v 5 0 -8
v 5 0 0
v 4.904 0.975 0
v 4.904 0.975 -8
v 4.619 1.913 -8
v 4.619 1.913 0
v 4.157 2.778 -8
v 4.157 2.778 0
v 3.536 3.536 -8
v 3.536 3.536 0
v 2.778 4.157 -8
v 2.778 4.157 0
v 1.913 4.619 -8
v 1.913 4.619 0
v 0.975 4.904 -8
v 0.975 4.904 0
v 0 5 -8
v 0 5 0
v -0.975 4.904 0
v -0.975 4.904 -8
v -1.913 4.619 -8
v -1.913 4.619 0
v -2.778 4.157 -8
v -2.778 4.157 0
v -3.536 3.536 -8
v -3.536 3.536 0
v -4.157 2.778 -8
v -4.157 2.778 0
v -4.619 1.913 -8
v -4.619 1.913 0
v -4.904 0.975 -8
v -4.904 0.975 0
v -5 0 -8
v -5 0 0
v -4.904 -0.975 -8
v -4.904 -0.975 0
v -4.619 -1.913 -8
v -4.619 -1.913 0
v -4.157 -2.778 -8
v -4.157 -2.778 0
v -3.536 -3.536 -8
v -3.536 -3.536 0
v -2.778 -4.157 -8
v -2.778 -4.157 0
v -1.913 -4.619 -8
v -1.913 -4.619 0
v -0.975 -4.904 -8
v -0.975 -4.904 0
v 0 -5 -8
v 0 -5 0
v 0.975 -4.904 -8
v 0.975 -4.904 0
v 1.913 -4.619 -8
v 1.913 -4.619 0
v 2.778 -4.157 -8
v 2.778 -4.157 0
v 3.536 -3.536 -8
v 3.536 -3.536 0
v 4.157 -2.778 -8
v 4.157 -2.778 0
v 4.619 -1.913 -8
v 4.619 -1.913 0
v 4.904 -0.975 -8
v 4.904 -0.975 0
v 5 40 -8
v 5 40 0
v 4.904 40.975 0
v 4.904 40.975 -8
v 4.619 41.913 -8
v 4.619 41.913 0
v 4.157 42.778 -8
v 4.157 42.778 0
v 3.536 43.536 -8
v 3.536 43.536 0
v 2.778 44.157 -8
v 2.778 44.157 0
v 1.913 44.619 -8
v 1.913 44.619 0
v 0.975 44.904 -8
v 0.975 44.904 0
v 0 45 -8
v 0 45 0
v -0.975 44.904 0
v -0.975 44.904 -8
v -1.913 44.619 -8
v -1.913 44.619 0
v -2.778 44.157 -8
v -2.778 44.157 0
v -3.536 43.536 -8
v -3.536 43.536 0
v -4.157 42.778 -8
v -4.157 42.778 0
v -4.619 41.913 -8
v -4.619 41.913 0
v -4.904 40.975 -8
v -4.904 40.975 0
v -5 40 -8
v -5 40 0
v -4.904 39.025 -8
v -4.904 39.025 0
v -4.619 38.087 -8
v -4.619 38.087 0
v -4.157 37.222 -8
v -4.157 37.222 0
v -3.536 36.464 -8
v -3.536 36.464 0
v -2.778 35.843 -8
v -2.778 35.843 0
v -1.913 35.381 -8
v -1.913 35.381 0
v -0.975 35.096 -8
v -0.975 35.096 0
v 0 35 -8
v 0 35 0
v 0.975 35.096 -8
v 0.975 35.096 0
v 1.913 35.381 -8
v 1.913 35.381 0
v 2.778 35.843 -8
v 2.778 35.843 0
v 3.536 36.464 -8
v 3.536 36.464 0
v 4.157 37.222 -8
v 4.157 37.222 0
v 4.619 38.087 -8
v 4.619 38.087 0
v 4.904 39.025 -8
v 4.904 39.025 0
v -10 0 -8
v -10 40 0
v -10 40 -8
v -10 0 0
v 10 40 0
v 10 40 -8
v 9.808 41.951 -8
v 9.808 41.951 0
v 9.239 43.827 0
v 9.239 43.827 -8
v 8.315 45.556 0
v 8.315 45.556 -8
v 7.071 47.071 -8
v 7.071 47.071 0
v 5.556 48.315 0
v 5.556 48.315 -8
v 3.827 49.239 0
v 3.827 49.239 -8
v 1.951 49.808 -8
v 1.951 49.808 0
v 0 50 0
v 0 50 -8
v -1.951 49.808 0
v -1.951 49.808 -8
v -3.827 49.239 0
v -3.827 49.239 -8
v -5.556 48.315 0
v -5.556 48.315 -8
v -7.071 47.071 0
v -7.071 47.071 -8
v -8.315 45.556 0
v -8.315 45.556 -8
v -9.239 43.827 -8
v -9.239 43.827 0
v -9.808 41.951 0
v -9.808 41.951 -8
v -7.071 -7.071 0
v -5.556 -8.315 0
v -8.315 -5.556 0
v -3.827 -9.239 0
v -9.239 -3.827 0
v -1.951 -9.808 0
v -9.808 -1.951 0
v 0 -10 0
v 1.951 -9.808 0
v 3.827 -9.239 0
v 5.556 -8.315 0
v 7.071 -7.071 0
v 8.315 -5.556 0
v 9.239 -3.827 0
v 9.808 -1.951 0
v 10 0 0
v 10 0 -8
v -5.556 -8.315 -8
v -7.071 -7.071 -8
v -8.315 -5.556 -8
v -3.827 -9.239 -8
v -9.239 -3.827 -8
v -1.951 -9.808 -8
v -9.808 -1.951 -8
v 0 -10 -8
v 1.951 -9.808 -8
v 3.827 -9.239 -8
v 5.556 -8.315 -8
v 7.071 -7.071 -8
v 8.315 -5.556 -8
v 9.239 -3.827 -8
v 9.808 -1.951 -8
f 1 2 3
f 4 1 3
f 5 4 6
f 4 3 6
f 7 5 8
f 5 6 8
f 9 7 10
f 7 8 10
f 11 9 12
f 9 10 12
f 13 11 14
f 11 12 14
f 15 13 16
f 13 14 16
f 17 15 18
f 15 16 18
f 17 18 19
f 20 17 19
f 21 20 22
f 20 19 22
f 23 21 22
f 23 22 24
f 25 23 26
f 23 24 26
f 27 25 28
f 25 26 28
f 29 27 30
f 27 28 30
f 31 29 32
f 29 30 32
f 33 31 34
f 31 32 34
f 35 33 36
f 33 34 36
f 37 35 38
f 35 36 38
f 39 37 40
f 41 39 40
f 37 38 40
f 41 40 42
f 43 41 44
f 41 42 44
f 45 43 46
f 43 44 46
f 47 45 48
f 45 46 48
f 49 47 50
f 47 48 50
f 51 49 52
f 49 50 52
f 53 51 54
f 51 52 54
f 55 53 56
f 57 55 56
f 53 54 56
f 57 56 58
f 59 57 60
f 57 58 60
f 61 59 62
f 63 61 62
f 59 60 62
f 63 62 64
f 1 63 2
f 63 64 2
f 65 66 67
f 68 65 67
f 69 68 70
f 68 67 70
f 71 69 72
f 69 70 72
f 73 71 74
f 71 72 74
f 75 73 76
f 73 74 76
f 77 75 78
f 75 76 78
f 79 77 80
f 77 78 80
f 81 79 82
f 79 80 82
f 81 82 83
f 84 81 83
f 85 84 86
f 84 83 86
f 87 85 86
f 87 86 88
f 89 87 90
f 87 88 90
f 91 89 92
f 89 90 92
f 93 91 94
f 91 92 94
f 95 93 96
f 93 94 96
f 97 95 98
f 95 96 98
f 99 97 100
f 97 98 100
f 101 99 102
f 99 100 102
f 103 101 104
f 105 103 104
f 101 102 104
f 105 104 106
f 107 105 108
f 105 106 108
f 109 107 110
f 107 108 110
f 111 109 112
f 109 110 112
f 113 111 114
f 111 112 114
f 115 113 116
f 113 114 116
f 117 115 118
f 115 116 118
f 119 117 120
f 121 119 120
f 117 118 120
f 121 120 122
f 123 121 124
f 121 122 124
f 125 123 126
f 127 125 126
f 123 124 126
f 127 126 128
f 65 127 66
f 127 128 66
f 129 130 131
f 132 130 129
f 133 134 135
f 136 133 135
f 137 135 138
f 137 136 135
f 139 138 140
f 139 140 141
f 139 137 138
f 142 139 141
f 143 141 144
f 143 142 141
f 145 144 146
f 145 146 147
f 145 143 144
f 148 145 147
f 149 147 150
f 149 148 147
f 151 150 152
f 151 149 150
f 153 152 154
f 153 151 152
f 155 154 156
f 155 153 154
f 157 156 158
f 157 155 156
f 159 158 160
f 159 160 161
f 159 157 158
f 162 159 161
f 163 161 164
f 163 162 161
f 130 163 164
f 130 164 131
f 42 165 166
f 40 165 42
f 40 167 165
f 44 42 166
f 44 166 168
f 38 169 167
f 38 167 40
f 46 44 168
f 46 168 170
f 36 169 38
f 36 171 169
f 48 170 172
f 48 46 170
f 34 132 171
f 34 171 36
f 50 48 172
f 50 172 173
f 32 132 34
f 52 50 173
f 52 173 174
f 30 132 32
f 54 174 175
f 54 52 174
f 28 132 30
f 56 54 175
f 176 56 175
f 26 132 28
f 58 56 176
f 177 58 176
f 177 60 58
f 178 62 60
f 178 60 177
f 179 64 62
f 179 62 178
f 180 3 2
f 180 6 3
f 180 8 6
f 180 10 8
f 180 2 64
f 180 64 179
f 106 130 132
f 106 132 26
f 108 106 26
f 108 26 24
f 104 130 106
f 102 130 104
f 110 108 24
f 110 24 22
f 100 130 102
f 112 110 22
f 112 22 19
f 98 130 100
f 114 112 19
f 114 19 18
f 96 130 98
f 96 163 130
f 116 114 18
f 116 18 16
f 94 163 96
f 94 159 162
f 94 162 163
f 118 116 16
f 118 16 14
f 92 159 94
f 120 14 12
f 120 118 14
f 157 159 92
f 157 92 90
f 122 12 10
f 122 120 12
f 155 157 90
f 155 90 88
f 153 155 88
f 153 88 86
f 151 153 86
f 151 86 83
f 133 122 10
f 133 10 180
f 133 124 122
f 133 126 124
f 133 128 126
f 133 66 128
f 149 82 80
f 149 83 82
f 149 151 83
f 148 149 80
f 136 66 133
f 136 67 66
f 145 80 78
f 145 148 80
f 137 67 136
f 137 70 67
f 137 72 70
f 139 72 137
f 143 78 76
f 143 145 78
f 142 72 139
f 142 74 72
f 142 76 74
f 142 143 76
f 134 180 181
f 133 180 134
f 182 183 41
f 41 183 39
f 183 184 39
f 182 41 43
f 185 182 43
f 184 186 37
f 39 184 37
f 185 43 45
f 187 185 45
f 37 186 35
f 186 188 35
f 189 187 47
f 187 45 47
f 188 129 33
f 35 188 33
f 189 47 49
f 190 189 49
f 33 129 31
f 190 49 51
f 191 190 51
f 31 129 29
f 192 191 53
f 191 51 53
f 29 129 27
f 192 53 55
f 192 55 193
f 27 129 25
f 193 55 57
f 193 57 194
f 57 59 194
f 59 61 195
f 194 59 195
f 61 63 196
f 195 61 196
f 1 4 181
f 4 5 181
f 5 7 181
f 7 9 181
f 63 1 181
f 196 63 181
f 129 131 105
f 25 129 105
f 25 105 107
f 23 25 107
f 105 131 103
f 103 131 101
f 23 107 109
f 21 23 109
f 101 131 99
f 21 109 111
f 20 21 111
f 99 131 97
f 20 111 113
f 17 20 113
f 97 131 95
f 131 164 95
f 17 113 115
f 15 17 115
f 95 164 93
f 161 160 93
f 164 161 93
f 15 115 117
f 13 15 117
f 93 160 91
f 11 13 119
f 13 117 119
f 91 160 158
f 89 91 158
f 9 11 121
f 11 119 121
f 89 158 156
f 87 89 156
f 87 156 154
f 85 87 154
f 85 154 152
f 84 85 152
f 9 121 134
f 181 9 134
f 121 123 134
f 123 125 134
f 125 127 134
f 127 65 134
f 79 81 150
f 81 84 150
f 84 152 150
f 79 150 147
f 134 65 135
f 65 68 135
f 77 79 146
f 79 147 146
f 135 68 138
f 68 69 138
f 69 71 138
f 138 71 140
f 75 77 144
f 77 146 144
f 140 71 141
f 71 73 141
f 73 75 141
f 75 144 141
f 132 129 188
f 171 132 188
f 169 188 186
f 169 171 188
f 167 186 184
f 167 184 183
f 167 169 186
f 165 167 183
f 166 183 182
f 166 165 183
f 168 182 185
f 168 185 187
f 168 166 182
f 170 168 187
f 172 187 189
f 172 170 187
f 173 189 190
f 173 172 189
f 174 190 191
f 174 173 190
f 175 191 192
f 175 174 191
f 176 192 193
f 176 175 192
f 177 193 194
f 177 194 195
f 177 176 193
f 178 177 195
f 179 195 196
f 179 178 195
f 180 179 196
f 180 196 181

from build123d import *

# Parameters (mm, degrees)
SKETCH1_R           = 5
BOSS_EXTRUDE1_DEPTH = 8


with BuildPart() as part:
    # Sketch1 → Boss-Extrude1 (new body)
    with BuildSketch(Plane.XY):
        with BuildLine():
            Line((10, 0), (10, 40))
            ThreePointArc((10, 40), (0, 50), (-10, 40))
            Line((-10, 40), (-10, 0))
            ThreePointArc((-10, 0), (0, -10), (10, 0))
        make_face()
        with Locations((0, 40)):
            Circle(SKETCH1_R, mode=Mode.SUBTRACT)
        Circle(SKETCH1_R, mode=Mode.SUBTRACT)
    extrude(amount=-BOSS_EXTRUDE1_DEPTH)


solid = part.part
